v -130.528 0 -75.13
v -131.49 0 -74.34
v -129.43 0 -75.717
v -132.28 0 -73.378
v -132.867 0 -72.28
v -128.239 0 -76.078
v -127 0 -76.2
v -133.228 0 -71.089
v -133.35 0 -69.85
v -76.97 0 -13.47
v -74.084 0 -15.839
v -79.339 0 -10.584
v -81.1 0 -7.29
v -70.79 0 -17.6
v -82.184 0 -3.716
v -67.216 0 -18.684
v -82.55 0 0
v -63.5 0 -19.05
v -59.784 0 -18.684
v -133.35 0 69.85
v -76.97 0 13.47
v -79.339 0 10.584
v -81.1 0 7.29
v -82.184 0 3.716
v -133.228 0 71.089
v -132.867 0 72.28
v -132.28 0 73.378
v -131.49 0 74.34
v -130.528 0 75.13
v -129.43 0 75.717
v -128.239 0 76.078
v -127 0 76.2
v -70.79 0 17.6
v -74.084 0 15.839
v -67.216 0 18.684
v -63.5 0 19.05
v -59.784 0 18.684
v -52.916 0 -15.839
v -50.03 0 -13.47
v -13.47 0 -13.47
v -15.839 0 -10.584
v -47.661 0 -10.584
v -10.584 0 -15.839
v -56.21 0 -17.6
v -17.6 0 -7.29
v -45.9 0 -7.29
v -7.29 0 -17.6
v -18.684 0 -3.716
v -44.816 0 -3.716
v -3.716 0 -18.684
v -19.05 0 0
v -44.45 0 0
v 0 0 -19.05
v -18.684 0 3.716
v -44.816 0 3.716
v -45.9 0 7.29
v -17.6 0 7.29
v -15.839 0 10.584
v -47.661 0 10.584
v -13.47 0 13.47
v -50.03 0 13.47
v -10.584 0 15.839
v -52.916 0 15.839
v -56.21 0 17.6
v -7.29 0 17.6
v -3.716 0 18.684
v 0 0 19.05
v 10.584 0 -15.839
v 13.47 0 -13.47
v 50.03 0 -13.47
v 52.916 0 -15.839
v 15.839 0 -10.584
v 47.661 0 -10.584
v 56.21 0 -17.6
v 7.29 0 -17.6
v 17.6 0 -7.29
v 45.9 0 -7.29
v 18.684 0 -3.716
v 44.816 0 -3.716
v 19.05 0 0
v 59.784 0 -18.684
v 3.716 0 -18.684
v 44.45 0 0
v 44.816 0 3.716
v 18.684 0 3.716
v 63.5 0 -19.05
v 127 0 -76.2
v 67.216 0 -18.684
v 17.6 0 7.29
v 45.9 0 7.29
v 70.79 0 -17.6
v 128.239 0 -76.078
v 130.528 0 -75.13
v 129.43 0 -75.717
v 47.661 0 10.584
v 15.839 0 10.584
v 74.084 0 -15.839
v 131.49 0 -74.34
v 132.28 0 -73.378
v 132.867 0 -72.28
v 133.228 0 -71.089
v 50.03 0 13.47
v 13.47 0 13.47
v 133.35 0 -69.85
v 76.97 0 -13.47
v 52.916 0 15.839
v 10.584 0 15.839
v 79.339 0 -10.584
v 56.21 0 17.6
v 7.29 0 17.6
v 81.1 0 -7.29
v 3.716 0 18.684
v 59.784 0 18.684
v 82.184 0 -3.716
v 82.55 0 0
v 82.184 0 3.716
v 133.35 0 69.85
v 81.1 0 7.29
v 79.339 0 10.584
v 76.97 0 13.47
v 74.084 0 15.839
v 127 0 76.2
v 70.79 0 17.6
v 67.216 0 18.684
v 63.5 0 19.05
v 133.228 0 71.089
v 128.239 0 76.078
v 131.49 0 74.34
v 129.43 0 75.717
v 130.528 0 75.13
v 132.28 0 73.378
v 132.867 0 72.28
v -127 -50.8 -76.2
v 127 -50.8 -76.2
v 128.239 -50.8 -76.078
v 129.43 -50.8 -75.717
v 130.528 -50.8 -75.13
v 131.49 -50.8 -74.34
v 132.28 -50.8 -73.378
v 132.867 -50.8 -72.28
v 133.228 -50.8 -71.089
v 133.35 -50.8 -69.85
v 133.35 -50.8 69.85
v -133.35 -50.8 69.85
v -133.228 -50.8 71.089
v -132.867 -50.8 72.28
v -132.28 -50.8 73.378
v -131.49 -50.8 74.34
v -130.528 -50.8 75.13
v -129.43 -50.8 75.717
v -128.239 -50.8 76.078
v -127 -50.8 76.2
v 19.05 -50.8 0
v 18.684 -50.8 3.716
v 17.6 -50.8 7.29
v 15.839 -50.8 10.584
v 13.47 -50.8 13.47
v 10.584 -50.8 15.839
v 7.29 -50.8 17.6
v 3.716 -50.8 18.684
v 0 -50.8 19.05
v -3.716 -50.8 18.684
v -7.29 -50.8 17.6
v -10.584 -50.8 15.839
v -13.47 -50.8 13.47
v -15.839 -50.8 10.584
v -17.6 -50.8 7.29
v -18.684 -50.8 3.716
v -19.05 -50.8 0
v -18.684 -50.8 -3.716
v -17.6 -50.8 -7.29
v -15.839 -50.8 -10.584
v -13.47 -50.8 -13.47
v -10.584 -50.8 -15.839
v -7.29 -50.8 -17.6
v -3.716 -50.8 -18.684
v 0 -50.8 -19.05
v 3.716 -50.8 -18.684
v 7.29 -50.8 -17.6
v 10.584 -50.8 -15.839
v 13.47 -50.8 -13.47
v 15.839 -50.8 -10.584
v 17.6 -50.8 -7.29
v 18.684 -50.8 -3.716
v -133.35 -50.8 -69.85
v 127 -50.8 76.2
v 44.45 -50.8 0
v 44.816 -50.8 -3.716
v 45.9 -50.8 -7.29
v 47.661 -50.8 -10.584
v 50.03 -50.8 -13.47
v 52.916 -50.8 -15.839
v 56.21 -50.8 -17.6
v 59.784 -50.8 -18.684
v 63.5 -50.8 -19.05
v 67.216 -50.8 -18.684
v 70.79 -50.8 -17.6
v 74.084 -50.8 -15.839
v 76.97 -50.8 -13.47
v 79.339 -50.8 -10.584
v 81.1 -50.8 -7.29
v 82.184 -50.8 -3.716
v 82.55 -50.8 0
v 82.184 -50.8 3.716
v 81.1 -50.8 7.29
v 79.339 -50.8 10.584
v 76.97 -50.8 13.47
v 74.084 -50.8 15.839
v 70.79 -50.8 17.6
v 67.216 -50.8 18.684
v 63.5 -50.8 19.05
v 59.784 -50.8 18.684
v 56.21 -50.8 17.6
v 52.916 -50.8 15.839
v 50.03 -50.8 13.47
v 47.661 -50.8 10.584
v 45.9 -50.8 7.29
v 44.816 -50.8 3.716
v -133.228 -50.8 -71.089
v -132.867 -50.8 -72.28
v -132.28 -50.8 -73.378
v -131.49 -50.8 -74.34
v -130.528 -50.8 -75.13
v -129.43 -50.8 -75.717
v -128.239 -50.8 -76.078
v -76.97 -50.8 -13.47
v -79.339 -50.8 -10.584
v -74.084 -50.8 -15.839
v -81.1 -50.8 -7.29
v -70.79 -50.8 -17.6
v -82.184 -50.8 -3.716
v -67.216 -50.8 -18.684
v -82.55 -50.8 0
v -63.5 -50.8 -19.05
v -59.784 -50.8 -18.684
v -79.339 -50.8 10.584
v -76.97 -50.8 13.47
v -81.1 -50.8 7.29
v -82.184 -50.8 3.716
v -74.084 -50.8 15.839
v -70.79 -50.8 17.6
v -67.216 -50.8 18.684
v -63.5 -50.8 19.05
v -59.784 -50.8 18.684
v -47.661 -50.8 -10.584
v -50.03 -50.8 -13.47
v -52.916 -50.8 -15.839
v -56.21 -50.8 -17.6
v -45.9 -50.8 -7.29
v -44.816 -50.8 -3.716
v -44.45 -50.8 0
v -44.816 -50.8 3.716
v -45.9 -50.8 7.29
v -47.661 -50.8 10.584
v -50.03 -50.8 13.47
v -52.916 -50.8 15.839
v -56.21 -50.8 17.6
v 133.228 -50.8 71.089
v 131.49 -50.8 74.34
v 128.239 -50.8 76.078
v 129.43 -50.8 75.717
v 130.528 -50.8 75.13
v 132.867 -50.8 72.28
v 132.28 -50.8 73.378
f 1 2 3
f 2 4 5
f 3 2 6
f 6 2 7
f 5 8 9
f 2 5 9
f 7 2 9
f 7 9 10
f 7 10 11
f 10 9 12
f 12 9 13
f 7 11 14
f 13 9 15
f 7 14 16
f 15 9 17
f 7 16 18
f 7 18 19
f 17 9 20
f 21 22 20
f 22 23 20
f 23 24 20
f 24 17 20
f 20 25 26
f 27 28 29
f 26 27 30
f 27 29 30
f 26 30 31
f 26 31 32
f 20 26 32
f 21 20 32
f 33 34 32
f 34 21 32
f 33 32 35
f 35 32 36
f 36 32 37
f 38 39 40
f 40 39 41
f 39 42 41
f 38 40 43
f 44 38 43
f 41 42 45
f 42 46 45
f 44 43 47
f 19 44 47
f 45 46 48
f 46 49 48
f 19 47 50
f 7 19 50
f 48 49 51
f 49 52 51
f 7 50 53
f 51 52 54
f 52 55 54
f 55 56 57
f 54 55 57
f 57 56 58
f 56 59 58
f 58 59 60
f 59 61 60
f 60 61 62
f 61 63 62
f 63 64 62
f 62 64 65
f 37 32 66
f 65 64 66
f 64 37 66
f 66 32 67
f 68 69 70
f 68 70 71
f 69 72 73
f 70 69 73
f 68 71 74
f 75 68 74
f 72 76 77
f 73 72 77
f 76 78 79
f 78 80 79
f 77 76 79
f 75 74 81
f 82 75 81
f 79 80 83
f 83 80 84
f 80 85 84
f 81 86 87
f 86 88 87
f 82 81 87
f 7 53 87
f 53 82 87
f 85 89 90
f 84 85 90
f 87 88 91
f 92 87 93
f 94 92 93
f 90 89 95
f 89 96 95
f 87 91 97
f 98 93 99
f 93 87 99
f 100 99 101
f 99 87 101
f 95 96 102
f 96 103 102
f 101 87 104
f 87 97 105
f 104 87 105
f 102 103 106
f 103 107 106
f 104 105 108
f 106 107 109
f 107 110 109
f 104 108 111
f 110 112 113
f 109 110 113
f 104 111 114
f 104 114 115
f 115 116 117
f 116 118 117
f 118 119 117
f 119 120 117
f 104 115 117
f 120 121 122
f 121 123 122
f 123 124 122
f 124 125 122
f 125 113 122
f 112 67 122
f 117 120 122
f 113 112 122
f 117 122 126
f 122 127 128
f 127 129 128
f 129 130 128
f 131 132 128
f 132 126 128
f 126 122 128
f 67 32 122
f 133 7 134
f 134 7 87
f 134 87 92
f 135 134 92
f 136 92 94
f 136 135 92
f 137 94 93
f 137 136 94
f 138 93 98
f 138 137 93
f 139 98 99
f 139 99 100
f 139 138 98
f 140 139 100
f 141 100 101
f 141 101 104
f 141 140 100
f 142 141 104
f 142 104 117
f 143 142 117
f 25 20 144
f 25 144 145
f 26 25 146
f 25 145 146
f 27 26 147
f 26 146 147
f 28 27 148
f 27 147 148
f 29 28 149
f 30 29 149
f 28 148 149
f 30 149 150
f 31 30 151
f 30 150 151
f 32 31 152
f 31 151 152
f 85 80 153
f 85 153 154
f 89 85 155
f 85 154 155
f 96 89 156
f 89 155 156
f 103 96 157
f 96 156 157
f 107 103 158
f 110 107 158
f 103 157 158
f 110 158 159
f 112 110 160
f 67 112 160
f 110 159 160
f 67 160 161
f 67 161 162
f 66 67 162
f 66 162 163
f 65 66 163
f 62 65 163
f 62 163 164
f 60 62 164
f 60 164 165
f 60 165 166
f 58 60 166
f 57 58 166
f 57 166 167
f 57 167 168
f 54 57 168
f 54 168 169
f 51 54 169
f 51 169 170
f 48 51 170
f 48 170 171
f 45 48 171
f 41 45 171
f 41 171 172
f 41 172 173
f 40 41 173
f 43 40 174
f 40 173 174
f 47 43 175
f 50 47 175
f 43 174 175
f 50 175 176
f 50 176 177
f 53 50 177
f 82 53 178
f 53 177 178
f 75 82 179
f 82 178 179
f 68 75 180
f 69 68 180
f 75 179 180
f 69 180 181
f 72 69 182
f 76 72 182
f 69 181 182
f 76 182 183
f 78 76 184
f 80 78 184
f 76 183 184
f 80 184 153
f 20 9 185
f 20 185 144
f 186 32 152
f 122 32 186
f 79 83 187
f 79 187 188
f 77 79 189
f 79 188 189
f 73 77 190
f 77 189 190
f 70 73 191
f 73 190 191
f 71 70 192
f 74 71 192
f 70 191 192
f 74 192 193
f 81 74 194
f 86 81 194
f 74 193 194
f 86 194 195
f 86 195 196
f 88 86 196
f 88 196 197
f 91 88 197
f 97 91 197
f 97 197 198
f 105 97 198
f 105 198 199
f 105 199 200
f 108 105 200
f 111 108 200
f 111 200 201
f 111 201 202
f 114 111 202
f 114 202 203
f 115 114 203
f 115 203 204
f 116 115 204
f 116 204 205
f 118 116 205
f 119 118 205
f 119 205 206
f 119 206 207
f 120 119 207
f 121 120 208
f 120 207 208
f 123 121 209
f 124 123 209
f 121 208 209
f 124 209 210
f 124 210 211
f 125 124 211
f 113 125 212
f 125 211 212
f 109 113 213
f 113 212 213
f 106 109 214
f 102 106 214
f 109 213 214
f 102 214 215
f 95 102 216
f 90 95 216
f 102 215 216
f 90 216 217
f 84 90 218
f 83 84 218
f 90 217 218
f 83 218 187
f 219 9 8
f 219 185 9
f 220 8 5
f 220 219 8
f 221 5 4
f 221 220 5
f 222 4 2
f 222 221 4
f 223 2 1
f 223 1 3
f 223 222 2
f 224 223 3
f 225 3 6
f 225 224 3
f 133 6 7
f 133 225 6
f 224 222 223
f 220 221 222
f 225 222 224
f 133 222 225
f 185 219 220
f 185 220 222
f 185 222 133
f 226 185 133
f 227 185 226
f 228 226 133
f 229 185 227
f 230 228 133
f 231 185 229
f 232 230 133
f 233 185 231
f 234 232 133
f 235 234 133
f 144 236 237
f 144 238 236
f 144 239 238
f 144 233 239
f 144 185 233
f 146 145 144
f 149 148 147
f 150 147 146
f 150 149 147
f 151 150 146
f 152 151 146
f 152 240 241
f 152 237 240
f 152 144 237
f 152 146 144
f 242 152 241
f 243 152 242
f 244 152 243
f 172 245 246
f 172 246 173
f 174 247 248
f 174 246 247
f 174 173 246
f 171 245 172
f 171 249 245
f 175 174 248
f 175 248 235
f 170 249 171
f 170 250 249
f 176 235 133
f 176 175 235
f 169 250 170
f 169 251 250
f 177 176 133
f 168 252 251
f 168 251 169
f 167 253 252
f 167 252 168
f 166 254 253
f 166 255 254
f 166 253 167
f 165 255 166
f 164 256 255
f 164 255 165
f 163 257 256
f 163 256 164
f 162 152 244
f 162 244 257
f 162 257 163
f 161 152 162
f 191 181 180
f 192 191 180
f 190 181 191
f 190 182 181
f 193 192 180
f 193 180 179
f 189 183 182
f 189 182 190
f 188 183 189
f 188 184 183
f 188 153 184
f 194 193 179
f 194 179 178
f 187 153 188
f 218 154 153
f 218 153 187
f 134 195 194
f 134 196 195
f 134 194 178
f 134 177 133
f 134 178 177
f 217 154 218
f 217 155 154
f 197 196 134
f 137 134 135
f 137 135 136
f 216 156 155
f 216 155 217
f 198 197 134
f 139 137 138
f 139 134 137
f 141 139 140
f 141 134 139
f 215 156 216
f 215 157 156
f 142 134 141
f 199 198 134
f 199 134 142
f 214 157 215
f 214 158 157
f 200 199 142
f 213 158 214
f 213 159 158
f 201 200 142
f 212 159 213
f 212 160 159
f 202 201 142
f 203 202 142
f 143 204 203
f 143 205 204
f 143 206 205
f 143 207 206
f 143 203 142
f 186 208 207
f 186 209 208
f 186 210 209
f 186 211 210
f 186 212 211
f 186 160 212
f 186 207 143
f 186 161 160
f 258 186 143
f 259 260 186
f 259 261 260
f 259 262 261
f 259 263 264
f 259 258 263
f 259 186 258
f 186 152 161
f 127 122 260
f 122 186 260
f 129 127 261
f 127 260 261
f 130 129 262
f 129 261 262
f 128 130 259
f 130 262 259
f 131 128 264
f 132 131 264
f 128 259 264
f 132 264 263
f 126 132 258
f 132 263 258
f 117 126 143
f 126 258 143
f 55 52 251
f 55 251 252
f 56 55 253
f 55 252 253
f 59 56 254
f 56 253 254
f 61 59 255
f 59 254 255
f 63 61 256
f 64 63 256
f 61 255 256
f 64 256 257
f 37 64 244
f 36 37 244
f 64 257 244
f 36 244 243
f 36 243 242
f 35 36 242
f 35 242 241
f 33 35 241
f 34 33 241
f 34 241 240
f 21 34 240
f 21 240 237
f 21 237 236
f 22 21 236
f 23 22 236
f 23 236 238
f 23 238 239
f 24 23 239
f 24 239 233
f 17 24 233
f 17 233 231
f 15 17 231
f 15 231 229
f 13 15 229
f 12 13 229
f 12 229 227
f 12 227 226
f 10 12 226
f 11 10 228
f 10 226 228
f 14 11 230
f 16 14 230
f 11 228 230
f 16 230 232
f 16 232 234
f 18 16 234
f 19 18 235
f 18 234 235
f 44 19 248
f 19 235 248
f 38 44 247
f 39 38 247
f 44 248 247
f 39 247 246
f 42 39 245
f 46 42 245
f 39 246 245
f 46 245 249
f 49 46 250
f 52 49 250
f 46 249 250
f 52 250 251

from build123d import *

# Parameters (mm, degrees)
F0_W     = 266.7
F0_H     = 152.4
F1_DEPTH = 50.8
F2_R     = 19.05
F3_DEPTH = 76.2
F4_R     = 6.35


with BuildPart() as f1:
    # F0 (on Front) → F1 (new body)
    with BuildSketch(Plane.XZ):
        Rectangle(F0_W, F0_H)
    extrude(amount=F1_DEPTH)

    # F2 (on face) → F3 (cut)
    with BuildSketch(Plane.XZ.offset(50.8)):
        with BuildLine():
            ThreePointArc((-19.05, 0), (0, -19.05), (19.05, 0))
            ThreePointArc((19.05, 0), (0, 19.05), (-19.05, 0))
        make_face()
        with Locations((-63.5, 0)):
            Circle(F2_R)
        with BuildLine():
            ThreePointArc((82.55, 0), (63.5, 19.05), (44.45, 0))
            ThreePointArc((44.45, 0), (63.5, -19.05), (82.55, 0))
        make_face()
    extrude(amount=-F3_DEPTH, mode=Mode.SUBTRACT)

    # F4
    f4_edges = [f1.edges().sort_by_distance(p)[0] for p in [
        (133.35, -25.4, 76.2),
        (133.35, -25.4, -76.2),
        (-133.35, -25.4, 76.2),
        (-133.35, -25.4, -76.2),
    ]]
    fillet(f4_edges, radius=F4_R)


solid = f1.part
